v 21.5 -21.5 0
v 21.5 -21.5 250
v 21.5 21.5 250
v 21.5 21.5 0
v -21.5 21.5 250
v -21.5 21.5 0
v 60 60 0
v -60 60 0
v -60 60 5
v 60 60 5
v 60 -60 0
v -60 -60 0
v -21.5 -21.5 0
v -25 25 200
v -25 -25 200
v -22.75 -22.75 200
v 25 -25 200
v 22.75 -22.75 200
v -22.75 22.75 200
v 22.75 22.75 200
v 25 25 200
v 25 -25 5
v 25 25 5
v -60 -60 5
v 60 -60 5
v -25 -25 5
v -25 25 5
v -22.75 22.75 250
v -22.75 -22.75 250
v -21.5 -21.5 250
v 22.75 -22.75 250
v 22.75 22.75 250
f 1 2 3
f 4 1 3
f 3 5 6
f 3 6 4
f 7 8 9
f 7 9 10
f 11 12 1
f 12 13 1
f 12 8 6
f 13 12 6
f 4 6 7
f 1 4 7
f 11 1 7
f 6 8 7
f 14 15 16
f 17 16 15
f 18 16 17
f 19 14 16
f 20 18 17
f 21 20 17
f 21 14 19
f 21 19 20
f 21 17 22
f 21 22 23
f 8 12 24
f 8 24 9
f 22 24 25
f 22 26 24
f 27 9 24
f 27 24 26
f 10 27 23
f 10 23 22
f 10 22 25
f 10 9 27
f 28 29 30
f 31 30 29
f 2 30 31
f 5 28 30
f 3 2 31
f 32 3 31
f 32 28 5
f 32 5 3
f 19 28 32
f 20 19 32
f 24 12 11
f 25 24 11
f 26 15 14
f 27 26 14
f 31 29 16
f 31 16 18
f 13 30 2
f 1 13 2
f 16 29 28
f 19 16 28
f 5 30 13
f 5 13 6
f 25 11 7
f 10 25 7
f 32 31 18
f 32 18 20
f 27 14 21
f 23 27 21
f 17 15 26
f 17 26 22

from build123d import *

# Parameters (mm, degrees)
SKETCH_1_W          = 120
SKETCH_1_H          = 120
EXTRUDE_1_DEPTH     = 5
SKETCH_2_W          = 50
SKETCH_2_H          = 50
EXTRUDE_2_DEPTH     = 245
SKETCH_3_W          = 43
SKETCH_3_H          = 43
CUT_EXTRUDE_2_DEPTH = 250
SKETCH_6_W          = 50
SKETCH_6_H          = 50
SKETCH_6_W_2        = 47
SKETCH_6_H_2        = 47
CUT_EXTRUDE_5_DEPTH = 50
SKETCH_7_W          = 47
SKETCH_7_H          = 47
SKETCH_7_W_2        = 45.5
SKETCH_7_H_2        = 45.5
CUT_EXTRUDE_8_DEPTH = 50


with BuildPart() as part:
    # 草图1 → 凸台-拉伸1 (new body)
    with BuildSketch(Plane.XY):
        Rectangle(SKETCH_1_W, SKETCH_1_H)
    extrude(amount=EXTRUDE_1_DEPTH)

    # 草图2 → 凸台-拉伸2 (add)
    with BuildSketch(Plane.XY.offset(5)):
        Rectangle(SKETCH_2_W, SKETCH_2_H)
    extrude(amount=EXTRUDE_2_DEPTH)

    # 草图3 → 切除-拉伸2 (cut)
    with BuildSketch(Plane.XY.offset(250)):
        Rectangle(SKETCH_3_W, SKETCH_3_H)
    extrude(amount=-CUT_EXTRUDE_2_DEPTH, mode=Mode.SUBTRACT)

    # 草图6 → 切除-拉伸5 (cut)
    with BuildSketch(Plane.XY.offset(250)):
        Rectangle(SKETCH_6_W, SKETCH_6_H)
        Rectangle(SKETCH_6_W_2, SKETCH_6_H_2, mode=Mode.SUBTRACT)
    extrude(amount=-CUT_EXTRUDE_5_DEPTH, mode=Mode.SUBTRACT)

    # 草图7 → 切除-拉伸8 (cut)
    with BuildSketch(Plane.XY.offset(250)):
        Rectangle(SKETCH_7_W, SKETCH_7_H)
        Rectangle(SKETCH_7_W_2, SKETCH_7_H_2, mode=Mode.SUBTRACT)
    extrude(amount=-CUT_EXTRUDE_8_DEPTH, mode=Mode.SUBTRACT)


solid = part.part
